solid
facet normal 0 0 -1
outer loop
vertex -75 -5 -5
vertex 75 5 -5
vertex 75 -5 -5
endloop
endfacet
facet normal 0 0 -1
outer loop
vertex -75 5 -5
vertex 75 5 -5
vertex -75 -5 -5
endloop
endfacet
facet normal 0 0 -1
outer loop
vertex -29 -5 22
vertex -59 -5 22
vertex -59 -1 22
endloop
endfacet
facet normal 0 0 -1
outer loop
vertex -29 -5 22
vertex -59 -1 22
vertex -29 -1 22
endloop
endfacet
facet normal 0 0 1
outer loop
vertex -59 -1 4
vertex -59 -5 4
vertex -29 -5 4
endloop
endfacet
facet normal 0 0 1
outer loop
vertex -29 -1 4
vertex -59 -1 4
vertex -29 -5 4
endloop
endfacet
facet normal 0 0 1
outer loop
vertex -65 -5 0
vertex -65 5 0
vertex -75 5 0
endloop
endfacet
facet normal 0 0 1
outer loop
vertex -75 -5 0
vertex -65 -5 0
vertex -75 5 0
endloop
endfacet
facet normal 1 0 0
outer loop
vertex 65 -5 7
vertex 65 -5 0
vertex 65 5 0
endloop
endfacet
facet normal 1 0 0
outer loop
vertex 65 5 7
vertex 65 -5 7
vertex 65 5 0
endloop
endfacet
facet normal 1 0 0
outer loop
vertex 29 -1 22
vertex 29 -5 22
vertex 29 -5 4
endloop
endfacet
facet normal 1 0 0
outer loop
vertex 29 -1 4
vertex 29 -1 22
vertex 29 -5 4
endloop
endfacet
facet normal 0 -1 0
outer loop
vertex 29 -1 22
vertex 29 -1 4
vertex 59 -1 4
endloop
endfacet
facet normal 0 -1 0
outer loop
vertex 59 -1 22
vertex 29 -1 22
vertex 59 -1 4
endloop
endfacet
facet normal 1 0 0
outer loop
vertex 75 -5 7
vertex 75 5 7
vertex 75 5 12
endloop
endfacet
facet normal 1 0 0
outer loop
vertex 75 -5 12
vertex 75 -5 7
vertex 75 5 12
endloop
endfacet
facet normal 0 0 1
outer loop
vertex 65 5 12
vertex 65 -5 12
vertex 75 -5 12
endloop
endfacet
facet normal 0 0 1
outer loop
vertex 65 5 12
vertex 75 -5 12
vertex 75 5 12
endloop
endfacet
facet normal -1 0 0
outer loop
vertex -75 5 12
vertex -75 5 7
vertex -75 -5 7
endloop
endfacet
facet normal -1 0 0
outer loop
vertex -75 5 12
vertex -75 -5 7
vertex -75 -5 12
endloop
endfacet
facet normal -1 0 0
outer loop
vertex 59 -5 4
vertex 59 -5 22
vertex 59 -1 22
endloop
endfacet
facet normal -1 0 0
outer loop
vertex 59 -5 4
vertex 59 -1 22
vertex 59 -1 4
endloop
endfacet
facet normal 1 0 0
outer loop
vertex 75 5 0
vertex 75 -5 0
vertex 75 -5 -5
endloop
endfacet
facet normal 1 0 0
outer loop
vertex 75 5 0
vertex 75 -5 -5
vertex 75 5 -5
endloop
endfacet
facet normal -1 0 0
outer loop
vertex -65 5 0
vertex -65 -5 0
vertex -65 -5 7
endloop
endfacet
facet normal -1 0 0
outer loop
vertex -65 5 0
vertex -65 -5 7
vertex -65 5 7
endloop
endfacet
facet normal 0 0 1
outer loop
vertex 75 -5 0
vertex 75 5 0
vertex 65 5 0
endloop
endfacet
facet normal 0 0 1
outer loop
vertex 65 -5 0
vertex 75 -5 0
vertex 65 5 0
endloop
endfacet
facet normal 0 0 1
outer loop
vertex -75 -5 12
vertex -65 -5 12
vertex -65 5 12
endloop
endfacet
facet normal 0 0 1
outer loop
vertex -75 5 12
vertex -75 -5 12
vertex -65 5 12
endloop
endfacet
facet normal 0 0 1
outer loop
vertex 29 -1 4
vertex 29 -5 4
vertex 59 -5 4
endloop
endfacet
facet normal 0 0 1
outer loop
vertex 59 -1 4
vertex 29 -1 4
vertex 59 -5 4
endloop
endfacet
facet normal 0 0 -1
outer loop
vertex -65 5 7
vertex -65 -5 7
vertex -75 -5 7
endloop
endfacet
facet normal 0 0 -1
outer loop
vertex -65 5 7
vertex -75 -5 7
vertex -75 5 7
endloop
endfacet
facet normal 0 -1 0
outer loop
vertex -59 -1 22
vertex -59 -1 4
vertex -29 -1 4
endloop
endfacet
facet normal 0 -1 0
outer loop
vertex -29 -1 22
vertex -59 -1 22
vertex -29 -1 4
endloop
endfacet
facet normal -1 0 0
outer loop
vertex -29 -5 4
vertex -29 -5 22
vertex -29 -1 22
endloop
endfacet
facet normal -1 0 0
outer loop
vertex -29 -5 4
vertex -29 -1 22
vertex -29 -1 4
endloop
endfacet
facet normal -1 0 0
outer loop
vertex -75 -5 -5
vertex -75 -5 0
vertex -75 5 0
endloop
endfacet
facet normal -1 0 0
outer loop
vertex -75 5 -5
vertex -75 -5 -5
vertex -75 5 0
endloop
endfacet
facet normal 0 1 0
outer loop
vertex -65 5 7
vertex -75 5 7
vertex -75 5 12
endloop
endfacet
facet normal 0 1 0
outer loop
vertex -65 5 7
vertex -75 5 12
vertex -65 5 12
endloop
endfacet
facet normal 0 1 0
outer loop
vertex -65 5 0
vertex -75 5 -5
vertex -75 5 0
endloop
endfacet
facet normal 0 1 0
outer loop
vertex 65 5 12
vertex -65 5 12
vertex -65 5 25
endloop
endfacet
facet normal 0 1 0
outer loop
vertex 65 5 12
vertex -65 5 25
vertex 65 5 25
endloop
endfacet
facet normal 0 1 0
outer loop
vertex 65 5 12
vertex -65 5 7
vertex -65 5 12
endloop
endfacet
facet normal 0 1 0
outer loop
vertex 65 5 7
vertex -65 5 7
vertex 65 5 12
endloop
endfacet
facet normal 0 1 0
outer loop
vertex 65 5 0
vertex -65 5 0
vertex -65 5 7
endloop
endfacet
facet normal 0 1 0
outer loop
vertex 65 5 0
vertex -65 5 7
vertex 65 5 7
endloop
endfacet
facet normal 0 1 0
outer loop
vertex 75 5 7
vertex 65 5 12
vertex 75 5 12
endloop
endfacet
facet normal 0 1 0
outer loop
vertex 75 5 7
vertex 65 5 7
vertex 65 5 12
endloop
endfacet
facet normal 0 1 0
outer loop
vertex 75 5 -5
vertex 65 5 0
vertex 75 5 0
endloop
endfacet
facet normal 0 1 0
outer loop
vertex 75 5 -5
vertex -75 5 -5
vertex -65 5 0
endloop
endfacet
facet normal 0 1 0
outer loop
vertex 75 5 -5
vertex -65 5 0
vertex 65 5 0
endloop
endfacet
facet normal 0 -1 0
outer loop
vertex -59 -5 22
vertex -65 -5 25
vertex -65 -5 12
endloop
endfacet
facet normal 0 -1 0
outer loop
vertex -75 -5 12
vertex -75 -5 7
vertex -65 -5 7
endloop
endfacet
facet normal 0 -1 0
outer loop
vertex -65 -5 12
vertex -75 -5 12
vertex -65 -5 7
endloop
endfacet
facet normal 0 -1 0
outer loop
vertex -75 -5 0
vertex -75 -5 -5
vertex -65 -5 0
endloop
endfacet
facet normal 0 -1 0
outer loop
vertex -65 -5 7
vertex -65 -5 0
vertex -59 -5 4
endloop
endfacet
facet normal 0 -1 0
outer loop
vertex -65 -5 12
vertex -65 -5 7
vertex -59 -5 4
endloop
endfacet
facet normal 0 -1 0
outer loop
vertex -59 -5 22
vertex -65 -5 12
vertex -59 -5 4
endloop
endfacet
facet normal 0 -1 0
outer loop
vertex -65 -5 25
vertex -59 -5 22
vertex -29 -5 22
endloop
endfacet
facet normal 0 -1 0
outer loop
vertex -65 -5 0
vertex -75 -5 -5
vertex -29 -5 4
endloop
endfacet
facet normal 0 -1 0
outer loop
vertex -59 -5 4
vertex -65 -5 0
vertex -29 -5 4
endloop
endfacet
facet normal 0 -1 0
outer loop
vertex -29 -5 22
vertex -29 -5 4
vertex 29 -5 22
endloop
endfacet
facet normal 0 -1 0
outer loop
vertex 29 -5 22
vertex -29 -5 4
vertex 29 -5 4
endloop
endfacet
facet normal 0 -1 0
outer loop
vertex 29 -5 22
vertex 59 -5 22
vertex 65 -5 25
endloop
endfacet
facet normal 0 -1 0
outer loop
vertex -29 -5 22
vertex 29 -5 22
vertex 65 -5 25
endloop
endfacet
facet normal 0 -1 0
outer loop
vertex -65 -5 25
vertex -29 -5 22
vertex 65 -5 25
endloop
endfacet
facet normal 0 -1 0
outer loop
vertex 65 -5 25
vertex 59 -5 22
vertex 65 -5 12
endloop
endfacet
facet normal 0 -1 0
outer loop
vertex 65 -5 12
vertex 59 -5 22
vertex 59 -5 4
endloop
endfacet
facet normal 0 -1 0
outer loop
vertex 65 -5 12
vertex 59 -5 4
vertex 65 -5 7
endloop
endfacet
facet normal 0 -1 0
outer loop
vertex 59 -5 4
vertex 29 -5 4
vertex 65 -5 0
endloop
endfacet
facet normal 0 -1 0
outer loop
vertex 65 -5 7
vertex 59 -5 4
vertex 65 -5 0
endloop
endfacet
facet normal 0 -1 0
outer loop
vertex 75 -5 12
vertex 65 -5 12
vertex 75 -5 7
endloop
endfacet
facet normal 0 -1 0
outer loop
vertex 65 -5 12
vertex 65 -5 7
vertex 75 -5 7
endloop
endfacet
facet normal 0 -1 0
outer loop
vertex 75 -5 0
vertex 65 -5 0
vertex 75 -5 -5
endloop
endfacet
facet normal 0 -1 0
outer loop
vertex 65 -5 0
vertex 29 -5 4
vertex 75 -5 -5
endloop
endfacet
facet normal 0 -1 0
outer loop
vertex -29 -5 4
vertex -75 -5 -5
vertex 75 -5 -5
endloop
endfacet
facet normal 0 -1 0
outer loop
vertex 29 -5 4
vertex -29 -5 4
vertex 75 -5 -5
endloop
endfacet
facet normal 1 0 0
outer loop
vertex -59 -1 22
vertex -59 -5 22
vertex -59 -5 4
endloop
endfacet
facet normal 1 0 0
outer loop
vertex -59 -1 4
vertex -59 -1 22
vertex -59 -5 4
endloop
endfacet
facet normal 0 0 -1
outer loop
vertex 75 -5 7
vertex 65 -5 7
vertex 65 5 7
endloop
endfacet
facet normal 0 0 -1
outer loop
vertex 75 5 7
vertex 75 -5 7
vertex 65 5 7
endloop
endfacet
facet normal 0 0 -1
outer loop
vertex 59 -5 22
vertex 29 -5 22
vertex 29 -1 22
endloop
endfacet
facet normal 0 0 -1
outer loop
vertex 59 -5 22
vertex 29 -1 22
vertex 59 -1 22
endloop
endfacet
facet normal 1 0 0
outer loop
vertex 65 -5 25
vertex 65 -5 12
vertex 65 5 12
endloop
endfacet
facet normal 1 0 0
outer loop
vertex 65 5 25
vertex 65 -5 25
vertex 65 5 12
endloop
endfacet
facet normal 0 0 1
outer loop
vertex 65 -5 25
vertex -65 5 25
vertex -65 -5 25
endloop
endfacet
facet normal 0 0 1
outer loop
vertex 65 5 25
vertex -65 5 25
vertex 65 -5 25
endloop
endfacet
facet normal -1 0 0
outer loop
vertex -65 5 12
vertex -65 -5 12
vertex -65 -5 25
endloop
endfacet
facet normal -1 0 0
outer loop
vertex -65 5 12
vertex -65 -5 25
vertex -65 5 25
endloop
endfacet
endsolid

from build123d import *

# Parameters (mm, degrees)
SKETCH_1_W          = 130
SKETCH_1_H          = 10
EXTRUDE_1_DEPTH     = 7
SKETCH_2_W          = 150
SKETCH_2_H          = 10
EXTRUDE_2_DEPTH     = 5
SKETCH_5_W          = 130
SKETCH_5_H          = 10
EXTRUDE_4_DEPTH     = 18
SKETCH_3_W          = 30
SKETCH_3_H          = 18
CUT_EXTRUDE_1_DEPTH = 4
SKETCH_6_W          = 5
SKETCH_6_H          = 10
EXTRUDE_5_DEPTH     = 10


with BuildPart() as part:
    # 스케치1 → 보스-돌출1 (new body)
    with BuildSketch(Plane.XY):
        Rectangle(SKETCH_1_W, SKETCH_1_H)
    extrude(amount=EXTRUDE_1_DEPTH)

    # 스케치2 → 보스-돌출2 (add)
    with BuildSketch(Plane(origin=(0, 0, 0), x_dir=(-1, 0, 0), z_dir=(0, 0, -1))):
        Rectangle(SKETCH_2_W, SKETCH_2_H)
    extrude(amount=EXTRUDE_2_DEPTH)

    # 스케치5 → 보스-돌출4 (add)
    with BuildSketch(Plane.XY.offset(7)):
        Rectangle(SKETCH_5_W, SKETCH_5_H)
    extrude(amount=EXTRUDE_4_DEPTH)

    # 스케치3 → 컷-돌출1 (cut)
    with BuildSketch(Plane(origin=(0, -5, 0), x_dir=(1, 0, 0), z_dir=(0, 1, 0))):
        with Locations((-44, -13)):
            Rectangle(SKETCH_3_W, SKETCH_3_H)
        with Locations((44, -13)):
            Rectangle(SKETCH_3_W, SKETCH_3_H)
    extrude(amount=CUT_EXTRUDE_1_DEPTH, mode=Mode.SUBTRACT)

    # 스케치6 → 보스-돌출5 (add)
    with BuildSketch(Plane.ZY.offset(65)):
        with Locations((9.5, 0)):
            Rectangle(SKETCH_6_W, SKETCH_6_H)
    extrude_5 = extrude(amount=EXTRUDE_5_DEPTH)

    # 대칭 복사1: 보스-돌출5 across plane
    add(extrude_5.mirror(Plane.ZY))


solid = part.part
